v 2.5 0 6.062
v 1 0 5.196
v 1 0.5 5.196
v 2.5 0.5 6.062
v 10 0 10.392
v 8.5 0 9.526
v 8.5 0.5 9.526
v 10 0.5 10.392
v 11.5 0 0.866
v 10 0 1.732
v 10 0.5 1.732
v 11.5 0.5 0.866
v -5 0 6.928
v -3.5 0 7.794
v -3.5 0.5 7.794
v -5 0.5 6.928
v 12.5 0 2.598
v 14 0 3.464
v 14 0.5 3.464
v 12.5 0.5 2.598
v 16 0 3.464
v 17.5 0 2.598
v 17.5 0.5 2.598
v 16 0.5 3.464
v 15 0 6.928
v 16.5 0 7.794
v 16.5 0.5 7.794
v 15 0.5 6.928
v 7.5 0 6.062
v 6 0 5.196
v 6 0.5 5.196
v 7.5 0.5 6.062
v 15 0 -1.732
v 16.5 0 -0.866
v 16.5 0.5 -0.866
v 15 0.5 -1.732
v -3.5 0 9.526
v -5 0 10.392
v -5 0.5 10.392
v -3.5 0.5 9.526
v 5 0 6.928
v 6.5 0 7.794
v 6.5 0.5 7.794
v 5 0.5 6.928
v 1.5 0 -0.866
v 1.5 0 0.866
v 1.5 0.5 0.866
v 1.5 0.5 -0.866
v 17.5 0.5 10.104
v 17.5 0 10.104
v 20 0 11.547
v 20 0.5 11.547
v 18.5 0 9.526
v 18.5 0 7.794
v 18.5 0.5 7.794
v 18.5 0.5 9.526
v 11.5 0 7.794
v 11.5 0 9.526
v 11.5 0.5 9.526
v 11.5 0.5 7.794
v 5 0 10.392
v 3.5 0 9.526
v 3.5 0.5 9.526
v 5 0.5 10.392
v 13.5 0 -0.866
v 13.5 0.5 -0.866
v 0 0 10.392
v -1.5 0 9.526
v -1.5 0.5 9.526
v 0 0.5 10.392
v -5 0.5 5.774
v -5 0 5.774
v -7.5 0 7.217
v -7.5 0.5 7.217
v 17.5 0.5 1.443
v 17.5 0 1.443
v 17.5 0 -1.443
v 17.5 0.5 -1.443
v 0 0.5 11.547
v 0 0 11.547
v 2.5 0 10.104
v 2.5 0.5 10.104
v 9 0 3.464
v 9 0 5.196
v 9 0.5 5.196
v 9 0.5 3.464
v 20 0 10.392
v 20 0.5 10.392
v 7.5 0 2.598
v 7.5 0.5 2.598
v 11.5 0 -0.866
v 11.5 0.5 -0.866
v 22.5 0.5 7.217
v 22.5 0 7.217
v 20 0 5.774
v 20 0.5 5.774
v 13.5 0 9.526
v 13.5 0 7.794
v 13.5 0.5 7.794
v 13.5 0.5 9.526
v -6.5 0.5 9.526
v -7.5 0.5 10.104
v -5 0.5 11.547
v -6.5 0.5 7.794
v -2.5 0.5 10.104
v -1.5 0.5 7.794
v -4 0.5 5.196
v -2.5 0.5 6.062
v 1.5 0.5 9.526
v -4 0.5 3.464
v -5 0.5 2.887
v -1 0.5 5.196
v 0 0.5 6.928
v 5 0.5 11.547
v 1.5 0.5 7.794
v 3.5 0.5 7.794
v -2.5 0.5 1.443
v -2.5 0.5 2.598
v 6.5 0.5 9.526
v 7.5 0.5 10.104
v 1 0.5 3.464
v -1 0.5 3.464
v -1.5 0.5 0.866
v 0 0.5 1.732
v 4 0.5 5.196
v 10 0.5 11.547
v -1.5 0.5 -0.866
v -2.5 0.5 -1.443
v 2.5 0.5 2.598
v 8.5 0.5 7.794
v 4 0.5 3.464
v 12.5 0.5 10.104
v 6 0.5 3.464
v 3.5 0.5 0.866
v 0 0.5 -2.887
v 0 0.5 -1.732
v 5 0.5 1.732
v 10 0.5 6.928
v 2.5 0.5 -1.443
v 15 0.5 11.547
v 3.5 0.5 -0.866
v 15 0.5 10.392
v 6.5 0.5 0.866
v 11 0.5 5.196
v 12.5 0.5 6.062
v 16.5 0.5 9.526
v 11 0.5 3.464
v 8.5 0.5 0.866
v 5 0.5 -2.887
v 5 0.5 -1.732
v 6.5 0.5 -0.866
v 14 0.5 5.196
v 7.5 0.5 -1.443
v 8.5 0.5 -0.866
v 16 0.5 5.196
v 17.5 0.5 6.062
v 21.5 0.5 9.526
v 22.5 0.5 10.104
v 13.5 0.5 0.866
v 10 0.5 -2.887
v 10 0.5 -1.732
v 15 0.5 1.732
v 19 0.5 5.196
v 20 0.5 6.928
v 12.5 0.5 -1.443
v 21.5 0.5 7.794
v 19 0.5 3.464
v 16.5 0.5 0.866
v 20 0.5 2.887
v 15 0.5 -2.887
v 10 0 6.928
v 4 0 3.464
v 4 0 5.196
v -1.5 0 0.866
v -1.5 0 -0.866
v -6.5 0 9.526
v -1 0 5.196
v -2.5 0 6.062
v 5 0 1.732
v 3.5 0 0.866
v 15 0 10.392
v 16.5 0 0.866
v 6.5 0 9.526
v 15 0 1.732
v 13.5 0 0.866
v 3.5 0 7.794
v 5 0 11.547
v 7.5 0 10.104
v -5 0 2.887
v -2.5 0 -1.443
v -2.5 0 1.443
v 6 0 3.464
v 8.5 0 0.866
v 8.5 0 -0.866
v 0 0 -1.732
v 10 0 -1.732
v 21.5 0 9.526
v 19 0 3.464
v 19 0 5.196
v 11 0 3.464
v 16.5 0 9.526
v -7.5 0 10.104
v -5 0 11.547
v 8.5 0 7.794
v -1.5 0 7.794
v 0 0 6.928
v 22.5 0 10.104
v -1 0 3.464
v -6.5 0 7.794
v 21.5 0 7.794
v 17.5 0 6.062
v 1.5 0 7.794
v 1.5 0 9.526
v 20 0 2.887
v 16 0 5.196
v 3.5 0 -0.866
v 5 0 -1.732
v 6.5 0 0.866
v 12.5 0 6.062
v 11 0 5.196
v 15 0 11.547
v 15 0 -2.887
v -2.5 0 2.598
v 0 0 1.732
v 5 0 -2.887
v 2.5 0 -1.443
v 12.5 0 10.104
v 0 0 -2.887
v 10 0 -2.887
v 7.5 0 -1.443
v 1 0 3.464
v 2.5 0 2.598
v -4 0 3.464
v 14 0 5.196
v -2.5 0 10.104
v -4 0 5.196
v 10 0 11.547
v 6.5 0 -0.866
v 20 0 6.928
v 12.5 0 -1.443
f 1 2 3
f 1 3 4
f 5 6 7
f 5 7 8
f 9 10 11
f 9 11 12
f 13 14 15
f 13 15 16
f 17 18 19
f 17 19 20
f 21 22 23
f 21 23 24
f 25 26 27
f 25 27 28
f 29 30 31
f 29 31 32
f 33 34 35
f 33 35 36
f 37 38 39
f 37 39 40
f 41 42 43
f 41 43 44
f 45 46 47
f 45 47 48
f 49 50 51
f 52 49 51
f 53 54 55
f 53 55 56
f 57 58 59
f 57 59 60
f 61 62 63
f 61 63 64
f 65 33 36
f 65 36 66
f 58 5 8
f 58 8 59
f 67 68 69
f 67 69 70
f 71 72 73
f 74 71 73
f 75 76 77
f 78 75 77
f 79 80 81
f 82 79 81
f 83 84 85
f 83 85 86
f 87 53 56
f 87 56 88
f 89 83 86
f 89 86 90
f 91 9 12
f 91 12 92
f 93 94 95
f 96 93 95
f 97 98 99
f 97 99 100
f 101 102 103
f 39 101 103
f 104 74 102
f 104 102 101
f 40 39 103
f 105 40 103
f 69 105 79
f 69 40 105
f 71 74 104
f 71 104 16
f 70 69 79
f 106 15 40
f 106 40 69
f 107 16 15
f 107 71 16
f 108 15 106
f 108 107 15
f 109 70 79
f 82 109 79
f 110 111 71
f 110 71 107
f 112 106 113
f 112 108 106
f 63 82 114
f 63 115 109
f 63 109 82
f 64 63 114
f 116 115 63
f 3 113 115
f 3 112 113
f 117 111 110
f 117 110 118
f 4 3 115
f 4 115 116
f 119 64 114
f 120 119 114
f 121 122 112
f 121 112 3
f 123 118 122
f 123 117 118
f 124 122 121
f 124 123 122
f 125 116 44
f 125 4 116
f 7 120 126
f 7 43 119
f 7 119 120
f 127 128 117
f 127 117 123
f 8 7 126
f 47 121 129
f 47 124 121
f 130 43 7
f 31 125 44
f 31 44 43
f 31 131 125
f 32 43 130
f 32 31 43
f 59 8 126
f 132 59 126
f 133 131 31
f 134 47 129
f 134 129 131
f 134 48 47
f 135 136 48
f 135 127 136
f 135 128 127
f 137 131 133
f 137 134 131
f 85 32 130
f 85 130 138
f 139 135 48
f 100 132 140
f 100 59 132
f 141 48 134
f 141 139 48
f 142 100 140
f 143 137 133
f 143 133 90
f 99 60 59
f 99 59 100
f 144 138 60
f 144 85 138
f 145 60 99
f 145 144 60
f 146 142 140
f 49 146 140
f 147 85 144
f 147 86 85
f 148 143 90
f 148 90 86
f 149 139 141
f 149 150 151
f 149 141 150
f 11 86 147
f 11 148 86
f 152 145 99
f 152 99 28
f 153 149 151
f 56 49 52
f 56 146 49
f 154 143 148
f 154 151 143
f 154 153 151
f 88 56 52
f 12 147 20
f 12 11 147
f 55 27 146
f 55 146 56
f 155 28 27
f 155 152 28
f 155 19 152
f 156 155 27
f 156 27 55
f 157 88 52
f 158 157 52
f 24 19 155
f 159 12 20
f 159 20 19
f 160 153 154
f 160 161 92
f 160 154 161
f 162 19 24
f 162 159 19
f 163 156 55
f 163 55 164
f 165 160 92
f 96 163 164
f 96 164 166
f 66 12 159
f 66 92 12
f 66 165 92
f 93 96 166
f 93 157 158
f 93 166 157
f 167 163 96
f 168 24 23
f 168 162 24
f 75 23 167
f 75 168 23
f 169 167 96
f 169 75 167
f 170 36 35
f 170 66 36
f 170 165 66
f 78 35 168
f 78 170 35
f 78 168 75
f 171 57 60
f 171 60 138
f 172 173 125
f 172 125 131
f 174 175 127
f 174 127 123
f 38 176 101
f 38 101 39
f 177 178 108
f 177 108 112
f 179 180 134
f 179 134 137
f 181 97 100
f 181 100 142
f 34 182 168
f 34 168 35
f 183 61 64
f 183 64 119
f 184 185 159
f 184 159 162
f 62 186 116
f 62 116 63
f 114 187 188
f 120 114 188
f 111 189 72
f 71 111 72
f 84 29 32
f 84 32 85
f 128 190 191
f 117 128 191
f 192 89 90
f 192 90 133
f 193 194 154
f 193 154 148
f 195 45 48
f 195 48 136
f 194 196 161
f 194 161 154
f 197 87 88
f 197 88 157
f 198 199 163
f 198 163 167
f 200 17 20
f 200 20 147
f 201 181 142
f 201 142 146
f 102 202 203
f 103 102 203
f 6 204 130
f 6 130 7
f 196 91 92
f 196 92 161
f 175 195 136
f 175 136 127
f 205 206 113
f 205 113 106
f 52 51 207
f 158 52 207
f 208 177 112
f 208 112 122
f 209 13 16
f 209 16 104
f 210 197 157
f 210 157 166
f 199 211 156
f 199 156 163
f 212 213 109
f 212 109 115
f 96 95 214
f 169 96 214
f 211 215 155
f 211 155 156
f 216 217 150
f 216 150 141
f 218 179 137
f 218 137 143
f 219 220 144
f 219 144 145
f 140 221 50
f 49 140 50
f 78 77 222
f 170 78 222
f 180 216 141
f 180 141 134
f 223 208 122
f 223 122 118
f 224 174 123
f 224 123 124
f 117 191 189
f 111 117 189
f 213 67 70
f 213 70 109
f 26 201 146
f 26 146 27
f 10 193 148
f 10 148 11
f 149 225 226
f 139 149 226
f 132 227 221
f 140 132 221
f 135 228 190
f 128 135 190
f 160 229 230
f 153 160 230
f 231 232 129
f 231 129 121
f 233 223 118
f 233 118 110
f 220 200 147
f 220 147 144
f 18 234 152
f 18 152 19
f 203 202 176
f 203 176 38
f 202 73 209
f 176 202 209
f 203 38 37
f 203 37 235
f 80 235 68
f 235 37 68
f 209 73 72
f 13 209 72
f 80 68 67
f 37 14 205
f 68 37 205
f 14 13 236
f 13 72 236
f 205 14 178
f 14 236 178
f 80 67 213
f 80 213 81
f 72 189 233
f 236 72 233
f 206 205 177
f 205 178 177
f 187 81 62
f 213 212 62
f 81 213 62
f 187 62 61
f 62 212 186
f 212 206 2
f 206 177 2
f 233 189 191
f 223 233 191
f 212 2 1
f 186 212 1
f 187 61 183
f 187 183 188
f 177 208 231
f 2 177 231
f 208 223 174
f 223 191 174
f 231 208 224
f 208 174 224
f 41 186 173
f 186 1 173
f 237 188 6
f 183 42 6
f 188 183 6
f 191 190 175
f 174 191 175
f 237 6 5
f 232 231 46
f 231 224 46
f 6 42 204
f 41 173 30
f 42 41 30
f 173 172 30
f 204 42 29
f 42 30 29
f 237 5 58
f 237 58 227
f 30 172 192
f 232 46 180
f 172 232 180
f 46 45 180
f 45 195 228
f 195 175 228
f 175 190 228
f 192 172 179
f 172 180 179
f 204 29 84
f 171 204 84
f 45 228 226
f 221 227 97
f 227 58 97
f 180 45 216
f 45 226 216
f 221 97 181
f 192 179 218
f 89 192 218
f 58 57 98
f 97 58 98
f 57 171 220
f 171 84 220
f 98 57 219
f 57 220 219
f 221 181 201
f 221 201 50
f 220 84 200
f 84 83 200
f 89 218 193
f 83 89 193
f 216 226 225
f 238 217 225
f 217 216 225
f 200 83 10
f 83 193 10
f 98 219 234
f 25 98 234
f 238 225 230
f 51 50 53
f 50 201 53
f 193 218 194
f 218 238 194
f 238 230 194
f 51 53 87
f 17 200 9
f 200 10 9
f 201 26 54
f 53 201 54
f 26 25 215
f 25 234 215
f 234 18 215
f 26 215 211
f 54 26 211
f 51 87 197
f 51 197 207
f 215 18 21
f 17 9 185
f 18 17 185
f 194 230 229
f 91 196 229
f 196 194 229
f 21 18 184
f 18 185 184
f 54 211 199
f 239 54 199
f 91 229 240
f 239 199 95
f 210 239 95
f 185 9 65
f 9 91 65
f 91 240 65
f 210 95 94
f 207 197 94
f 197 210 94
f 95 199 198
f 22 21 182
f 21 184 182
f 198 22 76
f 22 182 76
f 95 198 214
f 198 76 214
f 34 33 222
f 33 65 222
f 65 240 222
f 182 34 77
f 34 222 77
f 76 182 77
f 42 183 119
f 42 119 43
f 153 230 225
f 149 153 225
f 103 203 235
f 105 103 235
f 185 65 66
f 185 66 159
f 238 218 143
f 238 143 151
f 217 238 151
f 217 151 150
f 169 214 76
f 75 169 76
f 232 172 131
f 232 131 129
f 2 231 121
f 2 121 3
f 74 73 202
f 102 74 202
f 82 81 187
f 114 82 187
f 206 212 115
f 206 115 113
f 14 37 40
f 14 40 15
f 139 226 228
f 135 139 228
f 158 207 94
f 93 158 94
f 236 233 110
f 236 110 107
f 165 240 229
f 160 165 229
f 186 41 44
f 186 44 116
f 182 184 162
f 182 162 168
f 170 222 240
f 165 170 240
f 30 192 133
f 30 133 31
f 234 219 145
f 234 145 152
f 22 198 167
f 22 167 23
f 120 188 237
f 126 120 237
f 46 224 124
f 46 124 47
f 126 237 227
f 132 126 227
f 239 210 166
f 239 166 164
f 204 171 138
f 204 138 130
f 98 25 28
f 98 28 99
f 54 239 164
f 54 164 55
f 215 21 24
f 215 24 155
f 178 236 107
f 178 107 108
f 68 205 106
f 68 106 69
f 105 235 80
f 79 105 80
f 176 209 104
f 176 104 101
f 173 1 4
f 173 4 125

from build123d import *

# Parameters (mm, degrees)
BOSS_EXTRUDE2_DEPTH = 0.5


with BuildPart() as part:
    # Sketch1 → Boss-Extrude2 (new body)
    with BuildSketch(Plane(origin=(0, 0, 0), x_dir=(1, 0, 0), z_dir=(0, 1, 0))):
        Polygon((-2.5, -7.216878365), (0, -5.773502692), (0, -2.886751346), (-2.5, -1.443375673), (-5, -2.886751346), (-5, -5.773502692), align=None)
        Polygon((-1, -3.464101615), (-2.5, -2.598076211), (-4, -3.464101615), (-4, -5.196152423), (-2.5, -6.062177826), (-1, -5.196152423), align=None, mode=Mode.SUBTRACT)
        Polygon((-5, -11.547005384), (-2.5, -10.103629711), (-2.5, -7.216878365), (-5, -5.773502692), (-7.5, -7.216878365), (-7.5, -10.103629711), align=None)
        Polygon((-3.5, -7.794228634), (-5, -6.92820323), (-6.5, -7.794228634), (-6.5, -9.526279442), (-5, -10.392304845), (-3.5, -9.526279442), align=None, mode=Mode.SUBTRACT)
        Polygon((0, -11.547005384), (2.5, -10.103629711), (2.5, -7.216878365), (0, -5.773502692), (-2.5, -7.216878365), (-2.5, -10.103629711), align=None)
        Polygon((1.5, -7.794228634), (0, -6.92820323), (-1.5, -7.794228634), (-1.5, -9.526279442), (0, -10.392304845), (1.5, -9.526279442), align=None, mode=Mode.SUBTRACT)
        Polygon((5, -11.547005384), (7.5, -10.103629711), (7.5, -7.216878365), (5, -5.773502692), (2.5, -7.216878365), (2.5, -10.103629711), align=None)
        Polygon((6.5, -7.794228634), (5, -6.92820323), (3.5, -7.794228634), (3.5, -9.526279442), (5, -10.392304845), (6.5, -9.526279442), align=None, mode=Mode.SUBTRACT)
        Polygon((2.5, -7.216878365), (5, -5.773502692), (5, -2.886751346), (2.5, -1.443375673), (0, -2.886751346), (0, -5.773502692), align=None)
        Polygon((4, -3.464101615), (2.5, -2.598076211), (1, -3.464101615), (1, -5.196152423), (2.5, -6.062177826), (4, -5.196152423), align=None, mode=Mode.SUBTRACT)
        Polygon((2.5, -1.443375673), (2.5, 1.443375673), (0, 2.886751346), (-2.5, 1.443375673), (-2.5, -1.443375673), (0, -2.886751346), align=None)
        Polygon((1.5, 0.866025404), (0, 1.732050808), (-1.5, 0.866025404), (-1.5, -0.866025404), (0, -1.732050808), (1.5, -0.866025404), align=None, mode=Mode.SUBTRACT)
        Polygon((7.5, -1.443375673), (7.5, 1.443375673), (5, 2.886751346), (2.5, 1.443375673), (2.5, -1.443375673), (5, -2.886751346), align=None)
        Polygon((6.5, 0.866025404), (5, 1.732050808), (3.5, 0.866025404), (3.5, -0.866025404), (5, -1.732050808), (6.5, -0.866025404), align=None, mode=Mode.SUBTRACT)
        Polygon((7.5, -7.216878365), (10, -5.773502692), (10, -2.886751346), (7.5, -1.443375673), (5, -2.886751346), (5, -5.773502692), align=None)
        Polygon((9, -3.464101615), (7.5, -2.598076211), (6, -3.464101615), (6, -5.196152423), (7.5, -6.062177826), (9, -5.196152423), align=None, mode=Mode.SUBTRACT)
        Polygon((10, -11.547005384), (12.5, -10.103629711), (12.5, -7.216878365), (10, -5.773502692), (7.5, -7.216878365), (7.5, -10.103629711), align=None)
        Polygon((11.5, -7.794228634), (10, -6.92820323), (8.5, -7.794228634), (8.5, -9.526279442), (10, -10.392304845), (11.5, -9.526279442), align=None, mode=Mode.SUBTRACT)
        Polygon((22.5, -10.103629711), (22.5, -7.216878365), (20, -5.773502692), (17.5, -7.216878365), (17.5, -10.103629711), (20, -11.547005384), align=None)
        Polygon((21.5, -7.794228634), (20, -6.92820323), (18.5, -7.794228634), (18.5, -9.526279442), (20, -10.392304845), (21.5, -9.526279442), align=None, mode=Mode.SUBTRACT)
        Polygon((15, -11.547005384), (17.5, -10.103629711), (17.5, -7.216878365), (15, -5.773502692), (12.5, -7.216878365), (12.5, -10.103629711), align=None)
        Polygon((16.5, -7.794228634), (15, -6.92820323), (13.5, -7.794228634), (13.5, -9.526279442), (15, -10.392304845), (16.5, -9.526279442), align=None, mode=Mode.SUBTRACT)
        Polygon((20, -5.773502692), (20, -2.886751346), (17.5, -1.443375673), (15, -2.886751346), (15, -5.773502692), (17.5, -7.216878365), align=None)
        Polygon((19, -3.464101615), (17.5, -2.598076211), (16, -3.464101615), (16, -5.196152423), (17.5, -6.062177826), (19, -5.196152423), align=None, mode=Mode.SUBTRACT)
        Polygon((12.5, -7.216878365), (15, -5.773502692), (15, -2.886751346), (12.5, -1.443375673), (10, -2.886751346), (10, -5.773502692), align=None)
        Polygon((14, -3.464101615), (12.5, -2.598076211), (11, -3.464101615), (11, -5.196152423), (12.5, -6.062177826), (14, -5.196152423), align=None, mode=Mode.SUBTRACT)
        Polygon((17.5, -1.443375673), (17.5, 1.443375673), (15, 2.886751346), (12.5, 1.443375673), (12.5, -1.443375673), (15, -2.886751346), align=None)
        Polygon((16.5, 0.866025404), (15, 1.732050808), (13.5, 0.866025404), (13.5, -0.866025404), (15, -1.732050808), (16.5, -0.866025404), align=None, mode=Mode.SUBTRACT)
        Polygon((12.5, -1.443375673), (12.5, 1.443375673), (10, 2.886751346), (7.5, 1.443375673), (7.5, -1.443375673), (10, -2.886751346), align=None)
        Polygon((11.5, 0.866025404), (10, 1.732050808), (8.5, 0.866025404), (8.5, -0.866025404), (10, -1.732050808), (11.5, -0.866025404), align=None, mode=Mode.SUBTRACT)
    extrude(amount=BOSS_EXTRUDE2_DEPTH)


solid = part.part
